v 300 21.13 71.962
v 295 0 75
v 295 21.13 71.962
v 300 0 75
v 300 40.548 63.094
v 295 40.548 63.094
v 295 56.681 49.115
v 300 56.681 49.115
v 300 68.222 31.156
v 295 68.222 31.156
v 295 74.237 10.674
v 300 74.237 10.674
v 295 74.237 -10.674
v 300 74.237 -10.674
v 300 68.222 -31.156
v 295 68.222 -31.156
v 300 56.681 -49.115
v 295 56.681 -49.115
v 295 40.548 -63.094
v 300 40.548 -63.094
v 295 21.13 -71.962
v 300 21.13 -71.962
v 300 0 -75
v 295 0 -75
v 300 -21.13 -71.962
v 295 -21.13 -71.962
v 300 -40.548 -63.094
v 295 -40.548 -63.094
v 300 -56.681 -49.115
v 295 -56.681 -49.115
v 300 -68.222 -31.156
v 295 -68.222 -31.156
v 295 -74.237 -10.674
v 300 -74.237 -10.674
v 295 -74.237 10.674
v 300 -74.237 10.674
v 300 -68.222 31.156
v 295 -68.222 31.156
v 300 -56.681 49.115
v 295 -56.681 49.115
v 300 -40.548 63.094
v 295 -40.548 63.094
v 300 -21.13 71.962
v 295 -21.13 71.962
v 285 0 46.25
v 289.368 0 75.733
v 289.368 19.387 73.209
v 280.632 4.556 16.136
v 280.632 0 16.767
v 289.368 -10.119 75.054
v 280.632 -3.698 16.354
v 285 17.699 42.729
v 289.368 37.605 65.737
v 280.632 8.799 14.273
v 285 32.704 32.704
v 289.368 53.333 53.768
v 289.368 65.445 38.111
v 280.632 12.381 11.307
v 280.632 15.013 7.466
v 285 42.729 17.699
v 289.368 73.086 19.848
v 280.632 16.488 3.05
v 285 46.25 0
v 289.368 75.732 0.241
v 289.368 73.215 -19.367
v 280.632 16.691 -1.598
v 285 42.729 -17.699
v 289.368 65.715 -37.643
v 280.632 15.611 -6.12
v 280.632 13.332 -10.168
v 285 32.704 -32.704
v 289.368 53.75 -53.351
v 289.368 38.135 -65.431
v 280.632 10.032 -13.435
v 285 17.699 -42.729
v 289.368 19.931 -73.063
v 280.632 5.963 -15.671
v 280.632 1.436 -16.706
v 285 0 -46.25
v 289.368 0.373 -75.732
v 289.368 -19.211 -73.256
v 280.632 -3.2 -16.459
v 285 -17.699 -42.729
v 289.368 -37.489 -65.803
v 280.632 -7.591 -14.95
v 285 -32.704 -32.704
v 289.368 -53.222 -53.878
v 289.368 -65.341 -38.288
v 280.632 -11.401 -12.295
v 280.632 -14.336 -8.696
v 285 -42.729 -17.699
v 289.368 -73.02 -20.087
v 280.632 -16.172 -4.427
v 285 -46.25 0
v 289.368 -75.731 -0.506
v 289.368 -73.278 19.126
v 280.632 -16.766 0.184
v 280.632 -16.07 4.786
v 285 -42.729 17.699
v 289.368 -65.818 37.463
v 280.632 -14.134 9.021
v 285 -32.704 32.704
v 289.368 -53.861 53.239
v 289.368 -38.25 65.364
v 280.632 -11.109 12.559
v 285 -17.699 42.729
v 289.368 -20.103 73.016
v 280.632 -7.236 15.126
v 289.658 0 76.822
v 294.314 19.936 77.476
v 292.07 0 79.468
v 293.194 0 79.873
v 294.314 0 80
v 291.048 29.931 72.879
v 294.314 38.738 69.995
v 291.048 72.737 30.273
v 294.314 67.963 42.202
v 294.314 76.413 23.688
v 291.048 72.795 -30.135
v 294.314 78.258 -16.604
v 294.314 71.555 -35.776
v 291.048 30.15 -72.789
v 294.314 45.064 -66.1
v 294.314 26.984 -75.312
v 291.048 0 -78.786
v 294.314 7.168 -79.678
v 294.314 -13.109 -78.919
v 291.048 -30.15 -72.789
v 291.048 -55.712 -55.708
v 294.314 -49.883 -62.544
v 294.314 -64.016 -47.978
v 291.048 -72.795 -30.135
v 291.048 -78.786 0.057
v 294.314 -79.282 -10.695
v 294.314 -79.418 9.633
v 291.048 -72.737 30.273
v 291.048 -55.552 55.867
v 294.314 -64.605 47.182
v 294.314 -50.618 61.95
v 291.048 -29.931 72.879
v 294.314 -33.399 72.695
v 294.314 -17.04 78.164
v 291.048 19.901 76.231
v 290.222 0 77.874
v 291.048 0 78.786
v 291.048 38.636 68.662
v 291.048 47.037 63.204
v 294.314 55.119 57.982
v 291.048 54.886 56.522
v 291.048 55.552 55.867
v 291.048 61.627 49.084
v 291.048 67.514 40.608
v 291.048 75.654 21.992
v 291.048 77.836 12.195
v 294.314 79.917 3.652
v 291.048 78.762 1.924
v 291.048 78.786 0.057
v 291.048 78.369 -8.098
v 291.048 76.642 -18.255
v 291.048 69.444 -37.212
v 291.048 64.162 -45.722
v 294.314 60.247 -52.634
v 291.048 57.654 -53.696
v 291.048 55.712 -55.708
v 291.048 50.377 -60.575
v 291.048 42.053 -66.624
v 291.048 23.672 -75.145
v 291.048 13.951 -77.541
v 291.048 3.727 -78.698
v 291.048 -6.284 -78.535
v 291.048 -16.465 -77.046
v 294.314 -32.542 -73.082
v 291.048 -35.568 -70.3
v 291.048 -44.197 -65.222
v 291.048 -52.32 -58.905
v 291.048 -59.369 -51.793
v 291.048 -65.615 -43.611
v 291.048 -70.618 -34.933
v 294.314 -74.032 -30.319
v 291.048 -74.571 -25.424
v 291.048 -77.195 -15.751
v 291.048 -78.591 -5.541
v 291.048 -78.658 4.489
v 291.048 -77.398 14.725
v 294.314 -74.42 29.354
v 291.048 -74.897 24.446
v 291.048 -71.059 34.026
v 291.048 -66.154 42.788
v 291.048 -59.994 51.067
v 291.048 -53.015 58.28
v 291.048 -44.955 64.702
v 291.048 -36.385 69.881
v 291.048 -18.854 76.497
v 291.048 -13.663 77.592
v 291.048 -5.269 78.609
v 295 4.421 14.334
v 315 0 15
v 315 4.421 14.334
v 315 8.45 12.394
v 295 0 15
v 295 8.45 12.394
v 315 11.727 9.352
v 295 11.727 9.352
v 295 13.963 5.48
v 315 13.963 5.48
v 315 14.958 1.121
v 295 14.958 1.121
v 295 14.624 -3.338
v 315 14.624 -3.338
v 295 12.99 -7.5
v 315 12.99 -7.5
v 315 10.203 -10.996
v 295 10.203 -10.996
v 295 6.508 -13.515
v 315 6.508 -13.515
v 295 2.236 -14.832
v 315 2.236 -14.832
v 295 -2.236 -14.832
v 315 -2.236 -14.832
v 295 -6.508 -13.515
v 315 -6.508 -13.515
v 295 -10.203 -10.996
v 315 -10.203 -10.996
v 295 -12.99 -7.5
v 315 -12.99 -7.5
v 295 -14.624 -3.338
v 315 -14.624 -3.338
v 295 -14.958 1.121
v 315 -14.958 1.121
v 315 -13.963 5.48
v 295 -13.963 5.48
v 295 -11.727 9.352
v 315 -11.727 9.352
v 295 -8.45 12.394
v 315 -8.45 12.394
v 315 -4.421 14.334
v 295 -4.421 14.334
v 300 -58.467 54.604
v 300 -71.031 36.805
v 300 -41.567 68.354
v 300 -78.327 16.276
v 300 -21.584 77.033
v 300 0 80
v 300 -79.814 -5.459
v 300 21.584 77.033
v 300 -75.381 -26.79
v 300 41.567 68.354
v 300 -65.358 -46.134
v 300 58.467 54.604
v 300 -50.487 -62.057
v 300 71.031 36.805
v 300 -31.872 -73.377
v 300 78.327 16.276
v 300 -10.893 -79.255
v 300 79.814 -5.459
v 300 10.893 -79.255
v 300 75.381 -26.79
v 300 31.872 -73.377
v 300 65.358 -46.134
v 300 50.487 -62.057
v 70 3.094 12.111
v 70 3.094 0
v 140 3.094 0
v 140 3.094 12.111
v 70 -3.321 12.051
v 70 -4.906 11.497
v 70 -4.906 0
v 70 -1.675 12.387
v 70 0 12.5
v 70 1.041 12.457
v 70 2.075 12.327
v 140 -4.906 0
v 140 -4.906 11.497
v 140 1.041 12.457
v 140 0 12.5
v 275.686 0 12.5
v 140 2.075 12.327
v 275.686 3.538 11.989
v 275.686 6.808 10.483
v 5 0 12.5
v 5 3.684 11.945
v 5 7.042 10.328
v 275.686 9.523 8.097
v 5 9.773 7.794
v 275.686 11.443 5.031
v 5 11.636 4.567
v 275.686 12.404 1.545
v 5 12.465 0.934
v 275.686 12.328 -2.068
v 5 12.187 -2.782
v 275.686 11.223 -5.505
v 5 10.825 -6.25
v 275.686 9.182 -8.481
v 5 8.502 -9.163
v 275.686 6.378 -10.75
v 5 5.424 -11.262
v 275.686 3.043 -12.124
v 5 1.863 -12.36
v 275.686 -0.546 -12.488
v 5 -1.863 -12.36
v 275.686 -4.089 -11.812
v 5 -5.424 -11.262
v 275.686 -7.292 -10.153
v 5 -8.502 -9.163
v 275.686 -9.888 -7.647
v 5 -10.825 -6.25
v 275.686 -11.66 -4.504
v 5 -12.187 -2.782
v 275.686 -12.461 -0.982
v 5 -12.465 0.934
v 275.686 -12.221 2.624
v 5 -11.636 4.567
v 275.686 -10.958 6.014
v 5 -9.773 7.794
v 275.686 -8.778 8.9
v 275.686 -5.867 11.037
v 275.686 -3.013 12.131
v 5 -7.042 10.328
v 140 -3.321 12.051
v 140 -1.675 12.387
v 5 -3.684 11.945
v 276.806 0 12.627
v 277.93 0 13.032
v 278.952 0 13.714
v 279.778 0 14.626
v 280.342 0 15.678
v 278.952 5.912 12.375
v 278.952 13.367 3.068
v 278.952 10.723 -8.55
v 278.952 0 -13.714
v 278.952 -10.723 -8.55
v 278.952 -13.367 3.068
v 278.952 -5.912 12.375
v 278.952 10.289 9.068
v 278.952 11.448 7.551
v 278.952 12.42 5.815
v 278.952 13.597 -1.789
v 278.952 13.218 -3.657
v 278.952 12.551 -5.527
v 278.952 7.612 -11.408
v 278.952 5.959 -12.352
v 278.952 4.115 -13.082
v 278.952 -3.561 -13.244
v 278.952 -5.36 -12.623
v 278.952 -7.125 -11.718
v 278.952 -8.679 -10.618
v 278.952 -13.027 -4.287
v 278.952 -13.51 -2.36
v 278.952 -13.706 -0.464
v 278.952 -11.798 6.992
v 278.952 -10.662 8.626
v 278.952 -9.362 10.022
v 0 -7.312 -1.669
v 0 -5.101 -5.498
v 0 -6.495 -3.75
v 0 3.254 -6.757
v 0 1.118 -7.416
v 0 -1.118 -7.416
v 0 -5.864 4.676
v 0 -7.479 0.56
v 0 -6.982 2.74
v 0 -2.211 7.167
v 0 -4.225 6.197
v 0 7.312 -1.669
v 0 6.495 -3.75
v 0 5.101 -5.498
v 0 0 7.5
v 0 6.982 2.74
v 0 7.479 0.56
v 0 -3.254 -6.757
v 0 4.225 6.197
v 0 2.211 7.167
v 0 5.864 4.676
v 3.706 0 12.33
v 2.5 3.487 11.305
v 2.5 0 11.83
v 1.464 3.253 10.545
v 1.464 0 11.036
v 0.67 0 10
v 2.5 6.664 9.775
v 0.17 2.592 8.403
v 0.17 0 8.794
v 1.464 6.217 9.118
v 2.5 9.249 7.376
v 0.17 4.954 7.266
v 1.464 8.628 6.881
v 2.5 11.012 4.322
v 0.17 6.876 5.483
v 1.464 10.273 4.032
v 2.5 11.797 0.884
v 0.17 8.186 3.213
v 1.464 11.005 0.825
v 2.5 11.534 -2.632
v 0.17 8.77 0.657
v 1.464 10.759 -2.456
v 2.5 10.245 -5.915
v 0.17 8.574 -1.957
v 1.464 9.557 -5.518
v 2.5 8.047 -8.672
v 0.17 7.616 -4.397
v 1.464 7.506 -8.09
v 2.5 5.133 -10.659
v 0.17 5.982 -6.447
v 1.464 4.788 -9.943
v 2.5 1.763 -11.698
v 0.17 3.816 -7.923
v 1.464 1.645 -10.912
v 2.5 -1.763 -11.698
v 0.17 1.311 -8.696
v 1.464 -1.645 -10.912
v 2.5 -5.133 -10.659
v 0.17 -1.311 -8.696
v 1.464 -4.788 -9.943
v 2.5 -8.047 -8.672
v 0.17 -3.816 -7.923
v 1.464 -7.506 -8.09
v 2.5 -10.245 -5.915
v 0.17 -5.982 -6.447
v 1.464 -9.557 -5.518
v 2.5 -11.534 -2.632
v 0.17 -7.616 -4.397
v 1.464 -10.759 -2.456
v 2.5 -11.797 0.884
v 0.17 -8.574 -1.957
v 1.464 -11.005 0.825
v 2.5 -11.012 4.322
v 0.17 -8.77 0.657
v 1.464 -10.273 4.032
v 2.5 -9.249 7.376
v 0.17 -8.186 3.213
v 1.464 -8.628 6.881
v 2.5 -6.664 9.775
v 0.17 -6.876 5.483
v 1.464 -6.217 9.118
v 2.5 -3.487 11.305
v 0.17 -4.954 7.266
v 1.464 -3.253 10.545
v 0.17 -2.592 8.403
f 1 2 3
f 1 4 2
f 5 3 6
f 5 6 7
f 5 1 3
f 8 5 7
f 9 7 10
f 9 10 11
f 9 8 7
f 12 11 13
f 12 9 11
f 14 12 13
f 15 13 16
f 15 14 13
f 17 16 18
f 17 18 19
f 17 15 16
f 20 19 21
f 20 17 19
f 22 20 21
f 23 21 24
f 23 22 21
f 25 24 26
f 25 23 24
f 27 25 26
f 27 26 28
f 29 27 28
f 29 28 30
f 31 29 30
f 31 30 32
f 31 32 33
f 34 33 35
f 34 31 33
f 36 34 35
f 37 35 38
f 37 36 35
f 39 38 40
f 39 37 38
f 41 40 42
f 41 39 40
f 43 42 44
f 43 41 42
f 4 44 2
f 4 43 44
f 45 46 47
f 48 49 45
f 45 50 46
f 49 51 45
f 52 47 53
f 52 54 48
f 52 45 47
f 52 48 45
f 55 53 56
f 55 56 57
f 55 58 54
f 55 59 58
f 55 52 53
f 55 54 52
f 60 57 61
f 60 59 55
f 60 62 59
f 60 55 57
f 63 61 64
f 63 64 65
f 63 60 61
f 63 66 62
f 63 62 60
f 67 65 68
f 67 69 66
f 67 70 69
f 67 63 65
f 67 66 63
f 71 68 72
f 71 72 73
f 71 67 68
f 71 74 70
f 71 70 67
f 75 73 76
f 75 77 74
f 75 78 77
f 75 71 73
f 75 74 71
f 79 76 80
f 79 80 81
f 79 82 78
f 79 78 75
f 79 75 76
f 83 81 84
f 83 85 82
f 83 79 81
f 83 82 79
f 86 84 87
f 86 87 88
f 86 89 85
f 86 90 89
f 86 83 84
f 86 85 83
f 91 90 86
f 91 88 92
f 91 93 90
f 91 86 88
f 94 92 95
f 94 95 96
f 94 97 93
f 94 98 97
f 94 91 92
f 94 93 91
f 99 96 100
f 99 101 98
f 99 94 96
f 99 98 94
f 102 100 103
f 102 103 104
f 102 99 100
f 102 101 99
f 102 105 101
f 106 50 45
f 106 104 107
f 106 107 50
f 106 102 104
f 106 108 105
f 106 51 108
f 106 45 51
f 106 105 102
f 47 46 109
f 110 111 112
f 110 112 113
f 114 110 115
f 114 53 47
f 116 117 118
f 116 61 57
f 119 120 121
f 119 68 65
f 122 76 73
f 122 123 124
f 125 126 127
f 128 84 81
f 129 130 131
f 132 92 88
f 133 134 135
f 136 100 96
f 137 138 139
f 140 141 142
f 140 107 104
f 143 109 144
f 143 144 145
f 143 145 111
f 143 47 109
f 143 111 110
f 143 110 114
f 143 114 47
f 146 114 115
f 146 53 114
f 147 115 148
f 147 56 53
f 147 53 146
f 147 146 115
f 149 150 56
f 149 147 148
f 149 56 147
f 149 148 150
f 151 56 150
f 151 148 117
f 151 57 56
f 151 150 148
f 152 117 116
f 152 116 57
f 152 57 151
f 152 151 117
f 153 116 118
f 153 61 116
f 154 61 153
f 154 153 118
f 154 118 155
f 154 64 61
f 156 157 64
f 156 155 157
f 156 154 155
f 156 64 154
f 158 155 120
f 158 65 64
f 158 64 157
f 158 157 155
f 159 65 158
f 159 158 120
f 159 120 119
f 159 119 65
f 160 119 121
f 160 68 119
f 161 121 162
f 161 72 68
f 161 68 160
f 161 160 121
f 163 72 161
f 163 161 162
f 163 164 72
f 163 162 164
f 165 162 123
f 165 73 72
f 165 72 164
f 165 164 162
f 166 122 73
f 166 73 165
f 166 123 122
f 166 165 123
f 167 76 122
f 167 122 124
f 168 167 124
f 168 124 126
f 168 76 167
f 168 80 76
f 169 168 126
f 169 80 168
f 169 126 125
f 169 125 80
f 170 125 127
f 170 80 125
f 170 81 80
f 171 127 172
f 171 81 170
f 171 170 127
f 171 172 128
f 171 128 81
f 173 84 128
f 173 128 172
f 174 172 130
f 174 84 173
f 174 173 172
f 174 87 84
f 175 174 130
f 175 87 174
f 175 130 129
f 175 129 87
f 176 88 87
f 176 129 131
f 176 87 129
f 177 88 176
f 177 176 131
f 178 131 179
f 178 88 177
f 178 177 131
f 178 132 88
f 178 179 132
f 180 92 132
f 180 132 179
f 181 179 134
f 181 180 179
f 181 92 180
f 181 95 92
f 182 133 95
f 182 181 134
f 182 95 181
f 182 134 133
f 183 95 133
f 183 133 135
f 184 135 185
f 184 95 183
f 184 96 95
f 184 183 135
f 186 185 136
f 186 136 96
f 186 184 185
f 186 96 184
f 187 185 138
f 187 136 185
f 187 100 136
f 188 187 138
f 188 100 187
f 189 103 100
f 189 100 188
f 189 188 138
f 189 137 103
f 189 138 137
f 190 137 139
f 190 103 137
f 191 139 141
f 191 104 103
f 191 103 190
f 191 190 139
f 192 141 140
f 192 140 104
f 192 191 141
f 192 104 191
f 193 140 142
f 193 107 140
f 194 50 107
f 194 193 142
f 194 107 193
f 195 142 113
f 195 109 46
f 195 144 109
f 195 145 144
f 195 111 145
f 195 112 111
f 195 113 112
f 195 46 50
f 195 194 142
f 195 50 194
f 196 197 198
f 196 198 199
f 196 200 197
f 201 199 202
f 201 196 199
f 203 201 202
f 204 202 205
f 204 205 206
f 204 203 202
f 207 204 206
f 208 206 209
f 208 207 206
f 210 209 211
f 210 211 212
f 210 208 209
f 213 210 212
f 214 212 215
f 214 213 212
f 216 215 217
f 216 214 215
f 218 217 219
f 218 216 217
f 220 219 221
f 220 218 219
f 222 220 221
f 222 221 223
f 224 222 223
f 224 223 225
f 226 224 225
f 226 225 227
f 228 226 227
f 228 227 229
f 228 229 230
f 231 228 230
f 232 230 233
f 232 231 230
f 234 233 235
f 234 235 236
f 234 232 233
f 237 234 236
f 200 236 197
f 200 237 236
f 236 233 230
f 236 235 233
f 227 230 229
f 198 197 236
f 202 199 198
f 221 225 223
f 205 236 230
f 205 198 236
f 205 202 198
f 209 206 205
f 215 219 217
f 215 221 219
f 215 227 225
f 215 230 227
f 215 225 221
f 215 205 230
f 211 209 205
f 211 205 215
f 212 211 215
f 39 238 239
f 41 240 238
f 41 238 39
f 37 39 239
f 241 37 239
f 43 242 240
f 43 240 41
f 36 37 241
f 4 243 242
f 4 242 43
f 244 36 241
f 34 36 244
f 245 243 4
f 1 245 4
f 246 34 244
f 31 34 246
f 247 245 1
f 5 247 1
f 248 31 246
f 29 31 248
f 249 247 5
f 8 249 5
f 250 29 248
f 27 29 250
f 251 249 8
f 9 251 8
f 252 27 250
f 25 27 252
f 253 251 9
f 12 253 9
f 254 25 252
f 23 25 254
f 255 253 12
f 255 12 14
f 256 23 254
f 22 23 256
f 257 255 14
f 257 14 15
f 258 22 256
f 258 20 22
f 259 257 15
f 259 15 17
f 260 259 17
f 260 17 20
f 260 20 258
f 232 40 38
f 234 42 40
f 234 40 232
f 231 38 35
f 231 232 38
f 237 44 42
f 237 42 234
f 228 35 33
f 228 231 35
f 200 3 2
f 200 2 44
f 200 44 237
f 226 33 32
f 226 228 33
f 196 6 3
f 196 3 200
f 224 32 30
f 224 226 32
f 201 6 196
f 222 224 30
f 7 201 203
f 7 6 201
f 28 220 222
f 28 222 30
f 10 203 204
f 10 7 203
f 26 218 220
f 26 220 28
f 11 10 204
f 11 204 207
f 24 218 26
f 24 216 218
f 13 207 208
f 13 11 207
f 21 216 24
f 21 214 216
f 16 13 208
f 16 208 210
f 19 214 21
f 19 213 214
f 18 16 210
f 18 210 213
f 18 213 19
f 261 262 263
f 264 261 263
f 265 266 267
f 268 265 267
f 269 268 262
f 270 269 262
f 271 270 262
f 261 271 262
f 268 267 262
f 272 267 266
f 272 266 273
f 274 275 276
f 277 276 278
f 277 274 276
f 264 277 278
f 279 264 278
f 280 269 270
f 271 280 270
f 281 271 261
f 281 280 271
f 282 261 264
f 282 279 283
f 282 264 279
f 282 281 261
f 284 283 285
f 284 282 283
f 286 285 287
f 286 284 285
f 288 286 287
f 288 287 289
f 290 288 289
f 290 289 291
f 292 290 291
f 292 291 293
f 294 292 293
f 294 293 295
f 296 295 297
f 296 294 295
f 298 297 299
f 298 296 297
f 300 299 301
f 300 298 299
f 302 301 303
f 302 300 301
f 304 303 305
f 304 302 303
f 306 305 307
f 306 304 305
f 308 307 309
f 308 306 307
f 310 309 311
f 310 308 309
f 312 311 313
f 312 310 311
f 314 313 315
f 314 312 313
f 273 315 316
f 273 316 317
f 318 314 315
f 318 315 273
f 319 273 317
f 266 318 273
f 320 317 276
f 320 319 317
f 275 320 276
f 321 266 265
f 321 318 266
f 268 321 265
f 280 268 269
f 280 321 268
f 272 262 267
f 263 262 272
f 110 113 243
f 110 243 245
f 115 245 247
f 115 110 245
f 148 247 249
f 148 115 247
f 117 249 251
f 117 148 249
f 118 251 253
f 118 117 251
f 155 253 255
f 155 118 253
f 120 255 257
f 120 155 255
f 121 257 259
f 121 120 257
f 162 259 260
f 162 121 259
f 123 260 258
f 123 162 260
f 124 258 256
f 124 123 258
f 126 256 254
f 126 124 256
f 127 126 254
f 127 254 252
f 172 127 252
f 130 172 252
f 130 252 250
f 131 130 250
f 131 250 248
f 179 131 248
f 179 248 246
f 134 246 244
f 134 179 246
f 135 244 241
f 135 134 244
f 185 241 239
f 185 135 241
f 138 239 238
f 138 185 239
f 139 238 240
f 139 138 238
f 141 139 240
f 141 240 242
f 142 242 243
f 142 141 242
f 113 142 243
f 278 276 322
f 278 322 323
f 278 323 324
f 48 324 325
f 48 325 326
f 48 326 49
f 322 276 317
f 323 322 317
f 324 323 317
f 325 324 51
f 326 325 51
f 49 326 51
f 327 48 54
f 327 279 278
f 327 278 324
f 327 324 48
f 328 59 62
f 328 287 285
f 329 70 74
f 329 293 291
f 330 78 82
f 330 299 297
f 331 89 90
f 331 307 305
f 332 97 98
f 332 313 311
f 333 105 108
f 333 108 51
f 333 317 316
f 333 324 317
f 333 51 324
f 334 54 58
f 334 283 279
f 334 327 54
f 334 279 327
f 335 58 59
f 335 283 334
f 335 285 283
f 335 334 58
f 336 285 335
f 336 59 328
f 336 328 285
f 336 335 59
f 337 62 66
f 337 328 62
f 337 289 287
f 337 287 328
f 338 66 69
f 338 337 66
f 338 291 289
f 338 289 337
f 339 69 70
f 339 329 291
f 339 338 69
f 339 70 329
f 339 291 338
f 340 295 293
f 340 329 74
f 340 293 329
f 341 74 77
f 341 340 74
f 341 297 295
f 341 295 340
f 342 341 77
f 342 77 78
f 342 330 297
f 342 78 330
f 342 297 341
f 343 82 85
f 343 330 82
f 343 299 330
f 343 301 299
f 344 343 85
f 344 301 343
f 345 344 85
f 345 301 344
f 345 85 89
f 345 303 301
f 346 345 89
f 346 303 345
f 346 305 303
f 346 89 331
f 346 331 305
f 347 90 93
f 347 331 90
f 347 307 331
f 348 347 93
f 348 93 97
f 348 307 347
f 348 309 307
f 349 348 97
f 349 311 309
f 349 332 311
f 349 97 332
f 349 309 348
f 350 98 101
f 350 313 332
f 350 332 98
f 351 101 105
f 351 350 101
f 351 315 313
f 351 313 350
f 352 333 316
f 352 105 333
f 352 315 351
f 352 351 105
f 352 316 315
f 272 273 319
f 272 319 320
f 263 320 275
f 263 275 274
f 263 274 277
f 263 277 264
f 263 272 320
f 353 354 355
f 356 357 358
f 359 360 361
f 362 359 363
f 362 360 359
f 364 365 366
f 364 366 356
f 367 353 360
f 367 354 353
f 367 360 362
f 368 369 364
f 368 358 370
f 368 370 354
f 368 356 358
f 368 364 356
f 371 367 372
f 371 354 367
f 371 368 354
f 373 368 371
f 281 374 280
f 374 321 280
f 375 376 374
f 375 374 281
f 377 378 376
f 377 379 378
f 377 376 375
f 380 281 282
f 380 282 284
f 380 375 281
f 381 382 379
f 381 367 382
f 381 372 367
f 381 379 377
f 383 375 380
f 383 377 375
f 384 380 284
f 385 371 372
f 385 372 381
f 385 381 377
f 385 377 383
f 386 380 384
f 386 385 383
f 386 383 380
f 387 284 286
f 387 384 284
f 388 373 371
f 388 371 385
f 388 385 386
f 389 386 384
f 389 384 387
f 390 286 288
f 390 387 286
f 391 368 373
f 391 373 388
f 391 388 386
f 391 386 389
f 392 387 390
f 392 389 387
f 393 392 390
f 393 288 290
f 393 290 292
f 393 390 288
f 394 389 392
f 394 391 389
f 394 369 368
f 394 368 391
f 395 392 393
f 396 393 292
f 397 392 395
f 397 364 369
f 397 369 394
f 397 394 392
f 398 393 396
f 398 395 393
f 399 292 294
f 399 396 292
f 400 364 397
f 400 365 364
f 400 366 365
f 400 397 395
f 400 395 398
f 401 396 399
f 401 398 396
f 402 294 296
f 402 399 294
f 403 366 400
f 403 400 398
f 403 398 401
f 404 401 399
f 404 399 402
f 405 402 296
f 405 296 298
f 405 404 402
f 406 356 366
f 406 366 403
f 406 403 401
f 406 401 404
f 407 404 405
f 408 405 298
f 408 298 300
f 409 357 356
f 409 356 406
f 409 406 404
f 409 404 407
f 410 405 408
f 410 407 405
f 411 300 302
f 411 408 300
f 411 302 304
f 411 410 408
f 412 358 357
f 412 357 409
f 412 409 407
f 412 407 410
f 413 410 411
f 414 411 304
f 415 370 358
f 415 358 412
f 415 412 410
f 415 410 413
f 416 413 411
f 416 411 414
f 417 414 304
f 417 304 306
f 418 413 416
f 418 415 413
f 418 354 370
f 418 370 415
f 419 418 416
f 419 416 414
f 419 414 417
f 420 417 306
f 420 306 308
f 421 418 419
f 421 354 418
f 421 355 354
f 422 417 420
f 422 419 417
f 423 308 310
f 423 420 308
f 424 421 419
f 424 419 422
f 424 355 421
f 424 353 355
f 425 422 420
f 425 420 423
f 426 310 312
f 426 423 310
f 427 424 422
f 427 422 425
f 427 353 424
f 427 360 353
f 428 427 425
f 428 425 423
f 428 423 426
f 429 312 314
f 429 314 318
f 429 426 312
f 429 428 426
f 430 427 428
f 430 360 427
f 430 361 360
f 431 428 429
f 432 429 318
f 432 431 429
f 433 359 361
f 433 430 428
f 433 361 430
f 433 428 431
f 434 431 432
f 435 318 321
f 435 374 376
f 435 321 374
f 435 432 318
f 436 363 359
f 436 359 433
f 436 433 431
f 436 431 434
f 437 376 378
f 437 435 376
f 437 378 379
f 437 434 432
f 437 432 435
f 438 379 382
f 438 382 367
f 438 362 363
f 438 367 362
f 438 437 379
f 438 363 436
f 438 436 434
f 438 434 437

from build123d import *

# Parameters (mm, degrees)
F2_W     = 70
F2_H     = 8
F3_DEPTH = 12.501
F4_R     = 5
F5_R     = 5


with BuildPart() as f1:
    # F0 (on Front) → F1 (revolve)
    with BuildSketch(Plane.XZ):
        Polygon((0, 12.5), (0, 0), (295, 0), (315, 0), (315, 15), (295, 15), (295, 75), (300, 75), (300, 80), (290, 80), (280, 12.5), align=None)
    revolve(axis=Axis((147.5, 0, 0), (-1, 0, 0)))

    # F2 (on Top) → F3 (cut, through all)
    with BuildSketch(Plane.XY):
        with Locations((105, -0.9058431759)):
            Rectangle(F2_W, F2_H)
    extrude(amount=F3_DEPTH, mode=Mode.SUBTRACT)

    # F4
    f4_edges = [f1.edges().sort_by_distance(p)[0] for p in [
        (290, 0, -80),
        (280, 0, -12.5),
    ]]
    fillet(f4_edges, radius=F4_R)

    # F5
    f5_edges = [f1.edges().sort_by_distance(p)[0] for p in [
        (0, 0, -12.5),
    ]]
    fillet(f5_edges, radius=F5_R)


solid = f1.part
